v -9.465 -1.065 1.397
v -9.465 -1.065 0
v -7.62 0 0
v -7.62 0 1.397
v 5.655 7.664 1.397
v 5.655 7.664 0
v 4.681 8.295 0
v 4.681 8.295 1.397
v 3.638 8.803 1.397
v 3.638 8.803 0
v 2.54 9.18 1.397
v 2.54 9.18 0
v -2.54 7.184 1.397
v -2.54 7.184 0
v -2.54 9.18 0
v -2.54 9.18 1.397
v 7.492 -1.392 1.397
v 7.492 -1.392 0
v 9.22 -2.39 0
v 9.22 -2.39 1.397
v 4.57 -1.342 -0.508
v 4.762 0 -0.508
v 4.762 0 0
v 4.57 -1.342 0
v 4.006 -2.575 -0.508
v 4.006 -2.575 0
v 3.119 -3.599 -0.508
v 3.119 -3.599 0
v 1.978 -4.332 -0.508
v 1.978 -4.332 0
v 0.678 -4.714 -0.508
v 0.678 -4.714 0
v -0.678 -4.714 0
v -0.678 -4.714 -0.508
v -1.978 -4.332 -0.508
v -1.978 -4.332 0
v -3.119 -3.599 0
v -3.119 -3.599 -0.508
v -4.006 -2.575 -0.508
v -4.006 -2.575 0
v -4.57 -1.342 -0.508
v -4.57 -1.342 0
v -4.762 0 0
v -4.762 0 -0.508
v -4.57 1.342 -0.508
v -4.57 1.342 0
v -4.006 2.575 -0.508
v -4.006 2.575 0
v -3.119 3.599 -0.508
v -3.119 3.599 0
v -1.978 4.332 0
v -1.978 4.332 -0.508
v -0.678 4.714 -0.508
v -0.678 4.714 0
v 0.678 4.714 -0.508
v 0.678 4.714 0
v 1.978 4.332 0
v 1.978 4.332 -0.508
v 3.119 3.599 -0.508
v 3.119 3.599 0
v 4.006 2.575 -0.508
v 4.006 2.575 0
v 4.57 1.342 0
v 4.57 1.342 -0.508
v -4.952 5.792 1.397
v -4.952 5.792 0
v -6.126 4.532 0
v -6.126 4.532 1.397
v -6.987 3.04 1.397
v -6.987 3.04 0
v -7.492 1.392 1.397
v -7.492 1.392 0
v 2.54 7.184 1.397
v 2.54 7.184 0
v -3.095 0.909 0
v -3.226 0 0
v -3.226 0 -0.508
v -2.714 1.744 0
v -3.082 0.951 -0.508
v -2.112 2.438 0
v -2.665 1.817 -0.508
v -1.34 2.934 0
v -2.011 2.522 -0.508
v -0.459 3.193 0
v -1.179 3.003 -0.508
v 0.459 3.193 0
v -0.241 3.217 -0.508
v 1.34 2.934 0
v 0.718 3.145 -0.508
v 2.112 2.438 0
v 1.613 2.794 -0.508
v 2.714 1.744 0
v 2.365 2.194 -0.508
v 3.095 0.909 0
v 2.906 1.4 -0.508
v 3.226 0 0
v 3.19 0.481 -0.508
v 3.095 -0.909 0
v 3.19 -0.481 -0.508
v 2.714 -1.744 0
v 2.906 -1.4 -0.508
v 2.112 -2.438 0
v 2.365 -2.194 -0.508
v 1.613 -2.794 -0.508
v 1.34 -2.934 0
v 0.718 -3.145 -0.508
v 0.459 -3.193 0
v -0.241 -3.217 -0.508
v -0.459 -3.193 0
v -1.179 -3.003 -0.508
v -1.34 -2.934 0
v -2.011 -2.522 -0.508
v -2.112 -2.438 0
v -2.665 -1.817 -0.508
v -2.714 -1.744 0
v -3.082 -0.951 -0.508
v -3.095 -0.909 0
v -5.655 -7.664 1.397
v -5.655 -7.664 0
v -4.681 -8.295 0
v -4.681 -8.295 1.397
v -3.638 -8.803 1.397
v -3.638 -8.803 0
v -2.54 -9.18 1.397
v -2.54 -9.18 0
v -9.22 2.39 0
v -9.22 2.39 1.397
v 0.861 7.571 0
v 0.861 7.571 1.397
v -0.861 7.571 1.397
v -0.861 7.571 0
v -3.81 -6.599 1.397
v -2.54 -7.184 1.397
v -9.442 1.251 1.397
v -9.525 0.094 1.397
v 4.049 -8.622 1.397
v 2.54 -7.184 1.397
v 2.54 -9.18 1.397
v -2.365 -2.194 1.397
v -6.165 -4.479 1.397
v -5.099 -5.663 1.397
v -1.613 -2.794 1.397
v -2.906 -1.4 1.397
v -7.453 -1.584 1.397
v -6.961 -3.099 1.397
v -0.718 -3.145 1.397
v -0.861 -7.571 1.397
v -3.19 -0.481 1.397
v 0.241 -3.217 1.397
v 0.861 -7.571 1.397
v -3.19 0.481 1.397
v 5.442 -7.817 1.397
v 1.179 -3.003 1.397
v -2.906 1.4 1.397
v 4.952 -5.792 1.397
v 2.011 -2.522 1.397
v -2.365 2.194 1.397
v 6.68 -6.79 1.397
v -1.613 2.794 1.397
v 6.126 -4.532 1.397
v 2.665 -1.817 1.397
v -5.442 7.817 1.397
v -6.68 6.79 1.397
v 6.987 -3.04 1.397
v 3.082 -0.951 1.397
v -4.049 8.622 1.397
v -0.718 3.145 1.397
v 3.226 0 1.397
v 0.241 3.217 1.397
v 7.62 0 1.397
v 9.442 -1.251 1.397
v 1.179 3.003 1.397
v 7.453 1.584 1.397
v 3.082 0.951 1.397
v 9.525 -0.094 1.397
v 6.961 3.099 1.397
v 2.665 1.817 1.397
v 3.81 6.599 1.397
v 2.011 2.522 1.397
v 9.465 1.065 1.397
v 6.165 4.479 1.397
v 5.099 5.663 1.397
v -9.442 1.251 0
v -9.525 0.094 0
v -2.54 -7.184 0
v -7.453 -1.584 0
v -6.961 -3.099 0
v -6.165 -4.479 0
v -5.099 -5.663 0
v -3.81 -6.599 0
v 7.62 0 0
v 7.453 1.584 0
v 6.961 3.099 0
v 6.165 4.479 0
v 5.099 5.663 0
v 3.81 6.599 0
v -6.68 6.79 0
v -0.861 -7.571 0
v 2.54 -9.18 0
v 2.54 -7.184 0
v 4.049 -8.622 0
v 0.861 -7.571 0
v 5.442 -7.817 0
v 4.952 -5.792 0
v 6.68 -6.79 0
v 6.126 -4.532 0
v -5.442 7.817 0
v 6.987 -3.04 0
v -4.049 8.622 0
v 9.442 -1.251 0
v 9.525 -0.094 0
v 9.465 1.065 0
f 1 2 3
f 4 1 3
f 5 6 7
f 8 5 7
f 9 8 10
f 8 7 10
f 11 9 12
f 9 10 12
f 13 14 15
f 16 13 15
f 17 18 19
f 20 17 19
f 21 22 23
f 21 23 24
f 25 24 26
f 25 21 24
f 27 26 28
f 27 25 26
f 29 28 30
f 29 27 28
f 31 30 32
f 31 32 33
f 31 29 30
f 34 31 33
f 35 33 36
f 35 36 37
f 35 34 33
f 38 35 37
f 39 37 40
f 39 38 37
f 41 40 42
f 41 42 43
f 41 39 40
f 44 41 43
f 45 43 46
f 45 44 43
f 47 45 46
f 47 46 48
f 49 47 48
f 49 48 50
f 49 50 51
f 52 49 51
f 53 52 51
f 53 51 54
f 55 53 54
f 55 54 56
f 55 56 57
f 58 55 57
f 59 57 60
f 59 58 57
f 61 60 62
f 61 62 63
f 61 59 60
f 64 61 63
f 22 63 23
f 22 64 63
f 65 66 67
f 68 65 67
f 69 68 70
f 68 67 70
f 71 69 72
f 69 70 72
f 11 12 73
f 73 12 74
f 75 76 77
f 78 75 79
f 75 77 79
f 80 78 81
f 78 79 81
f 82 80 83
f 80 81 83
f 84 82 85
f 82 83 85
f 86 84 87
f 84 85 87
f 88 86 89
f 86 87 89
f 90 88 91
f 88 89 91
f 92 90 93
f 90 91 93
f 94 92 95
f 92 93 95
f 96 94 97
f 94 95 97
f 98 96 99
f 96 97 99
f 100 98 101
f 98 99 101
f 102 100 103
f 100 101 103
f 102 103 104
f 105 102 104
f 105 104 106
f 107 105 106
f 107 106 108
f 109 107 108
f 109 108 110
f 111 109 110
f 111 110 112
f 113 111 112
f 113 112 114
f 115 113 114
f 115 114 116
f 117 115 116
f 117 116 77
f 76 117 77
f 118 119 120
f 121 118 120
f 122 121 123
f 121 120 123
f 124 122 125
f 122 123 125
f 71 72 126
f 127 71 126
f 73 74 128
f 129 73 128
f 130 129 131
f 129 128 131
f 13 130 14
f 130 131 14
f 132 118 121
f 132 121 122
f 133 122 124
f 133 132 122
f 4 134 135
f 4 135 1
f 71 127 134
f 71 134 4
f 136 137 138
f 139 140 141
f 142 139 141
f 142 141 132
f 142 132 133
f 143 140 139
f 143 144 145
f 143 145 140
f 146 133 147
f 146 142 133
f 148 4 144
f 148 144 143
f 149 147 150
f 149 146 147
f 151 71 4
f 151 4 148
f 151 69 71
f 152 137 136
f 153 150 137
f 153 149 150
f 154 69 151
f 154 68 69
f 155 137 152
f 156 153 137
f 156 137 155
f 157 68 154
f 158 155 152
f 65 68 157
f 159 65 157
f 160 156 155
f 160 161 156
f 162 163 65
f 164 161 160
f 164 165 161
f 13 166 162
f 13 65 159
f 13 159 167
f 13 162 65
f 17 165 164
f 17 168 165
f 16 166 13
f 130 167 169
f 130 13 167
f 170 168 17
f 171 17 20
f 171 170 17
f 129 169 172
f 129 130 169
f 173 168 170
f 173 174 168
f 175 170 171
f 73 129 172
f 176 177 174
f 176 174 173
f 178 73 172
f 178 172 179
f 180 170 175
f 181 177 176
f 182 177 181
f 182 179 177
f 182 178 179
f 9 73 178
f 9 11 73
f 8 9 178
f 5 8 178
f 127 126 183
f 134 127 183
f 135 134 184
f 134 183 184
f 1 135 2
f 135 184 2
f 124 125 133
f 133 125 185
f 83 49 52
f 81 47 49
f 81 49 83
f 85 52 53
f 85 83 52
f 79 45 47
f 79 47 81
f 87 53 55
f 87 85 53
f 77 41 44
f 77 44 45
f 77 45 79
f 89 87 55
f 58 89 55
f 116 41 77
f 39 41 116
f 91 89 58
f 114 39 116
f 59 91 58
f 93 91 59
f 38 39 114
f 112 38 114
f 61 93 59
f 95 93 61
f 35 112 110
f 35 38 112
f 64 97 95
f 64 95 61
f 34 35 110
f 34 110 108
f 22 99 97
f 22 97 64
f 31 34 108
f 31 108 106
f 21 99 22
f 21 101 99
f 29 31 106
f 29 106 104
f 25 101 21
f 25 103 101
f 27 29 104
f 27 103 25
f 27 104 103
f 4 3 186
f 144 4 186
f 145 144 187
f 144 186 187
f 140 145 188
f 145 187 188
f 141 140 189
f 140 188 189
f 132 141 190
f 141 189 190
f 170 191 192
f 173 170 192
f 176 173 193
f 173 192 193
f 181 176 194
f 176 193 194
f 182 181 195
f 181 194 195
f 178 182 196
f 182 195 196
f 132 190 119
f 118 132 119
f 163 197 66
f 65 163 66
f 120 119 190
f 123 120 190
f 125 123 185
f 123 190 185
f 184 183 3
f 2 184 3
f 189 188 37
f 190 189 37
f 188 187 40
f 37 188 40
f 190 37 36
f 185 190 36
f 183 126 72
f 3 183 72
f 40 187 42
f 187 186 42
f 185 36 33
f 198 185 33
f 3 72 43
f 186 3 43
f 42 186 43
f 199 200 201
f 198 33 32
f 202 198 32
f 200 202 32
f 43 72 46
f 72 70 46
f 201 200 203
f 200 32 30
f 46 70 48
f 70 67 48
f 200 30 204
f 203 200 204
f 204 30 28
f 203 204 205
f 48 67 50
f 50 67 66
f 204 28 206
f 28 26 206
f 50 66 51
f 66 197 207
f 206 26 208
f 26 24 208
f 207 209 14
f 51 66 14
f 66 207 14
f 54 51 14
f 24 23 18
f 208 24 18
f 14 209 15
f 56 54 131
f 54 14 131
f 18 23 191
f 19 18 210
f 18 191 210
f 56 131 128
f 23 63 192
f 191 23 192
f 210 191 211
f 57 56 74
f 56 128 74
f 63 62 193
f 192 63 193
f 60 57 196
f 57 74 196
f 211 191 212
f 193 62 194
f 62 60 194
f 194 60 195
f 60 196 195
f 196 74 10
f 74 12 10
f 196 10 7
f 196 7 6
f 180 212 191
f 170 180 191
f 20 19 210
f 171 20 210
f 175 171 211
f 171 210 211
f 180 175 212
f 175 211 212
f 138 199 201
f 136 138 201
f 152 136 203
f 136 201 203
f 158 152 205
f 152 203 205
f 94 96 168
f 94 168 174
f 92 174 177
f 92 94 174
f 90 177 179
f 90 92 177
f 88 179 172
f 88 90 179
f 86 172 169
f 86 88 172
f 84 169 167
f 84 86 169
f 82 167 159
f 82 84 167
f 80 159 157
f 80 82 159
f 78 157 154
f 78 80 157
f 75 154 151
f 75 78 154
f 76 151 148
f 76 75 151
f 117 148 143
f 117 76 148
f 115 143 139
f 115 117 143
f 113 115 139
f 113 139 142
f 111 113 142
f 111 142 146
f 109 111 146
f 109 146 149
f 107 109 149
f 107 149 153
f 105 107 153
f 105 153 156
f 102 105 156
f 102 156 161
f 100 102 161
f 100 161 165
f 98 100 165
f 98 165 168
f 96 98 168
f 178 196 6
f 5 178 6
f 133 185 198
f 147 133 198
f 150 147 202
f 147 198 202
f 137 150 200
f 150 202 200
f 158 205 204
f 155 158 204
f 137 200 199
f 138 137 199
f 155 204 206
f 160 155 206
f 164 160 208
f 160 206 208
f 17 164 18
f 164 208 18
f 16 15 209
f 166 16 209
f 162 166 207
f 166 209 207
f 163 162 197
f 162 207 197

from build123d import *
from build123d.topology import SkipClean

# Parameters (mm, degrees)
SKETCH1_R      = 3.2258
EXTRUDE1_DEPTH = 1.397
EXTRUDE2_START = 0.508
SKETCH2_R      = 4.7625
SKETCH2_R_2    = 3.2258
EXTRUDE2_DEPTH = 0.508


with BuildPart() as part:
    # Sketch1 → Extrude1 (new body)
    with BuildSketch(Plane.XY):
        with BuildLine():
            Line((-7.491703947, 1.392397923), (-9.220189856, 2.390339728))
            ThreePointArc((-9.220189856, 2.390339728), (-9.501142646, 0.673730975), (-9.465234371, -1.065346561))
            Line((-9.465234371, -1.065346561), (-7.62, 0))
            ThreePointArc((-7.62, 0), (-6.599113577, -3.81), (-3.81, -6.599113577))
            Line((-3.81, -6.599113577), (-5.655234371, -7.664460138))
            ThreePointArc((-5.655234371, -7.664460138), (-4.167103183, -8.565096384), (-2.54, -9.180088507))
            Line((-2.54, -9.180088507), (-2.54, -7.184204897))
            ThreePointArc((-2.54, -7.184204897), (0, -7.62), (2.54, -7.184204897))
            Line((2.54, -7.184204897), (2.54, -9.180088507))
            ThreePointArc((2.54, -9.180088507), (4.7625, -8.248891971), (6.680189856, -6.789748779))
            Line((6.680189856, -6.789748779), (4.951703947, -5.791806974))
            ThreePointArc((4.951703947, -5.791806974), (6.599113577, -3.81), (7.491703947, -1.392397923))
            Line((7.491703947, -1.392397923), (9.220189856, -2.390339728))
            ThreePointArc((9.220189856, -2.390339728), (9.501142646, -0.673730975), (9.465234371, 1.065346561))
            Line((9.465234371, 1.065346561), (7.62, 0))
            ThreePointArc((7.62, 0), (6.599113577, 3.81), (3.81, 6.599113577))
            Line((3.81, 6.599113577), (5.655234371, 7.664460138))
            ThreePointArc((5.655234371, 7.664460138), (4.167103183, 8.565096384), (2.54, 9.180088507))
            Line((2.54, 9.180088507), (2.54, 7.184204897))
            ThreePointArc((2.54, 7.184204897), (0, 7.62), (-2.54, 7.184204897))
            Line((-2.54, 7.184204897), (-2.54, 9.180088507))
            ThreePointArc((-2.54, 9.180088507), (-4.7625, 8.248891971), (-6.680189856, 6.789748779))
            Line((-6.680189856, 6.789748779), (-4.951703947, 5.791806974))
            ThreePointArc((-4.951703947, 5.791806974), (-6.599113577, 3.81), (-7.491703947, 1.392397923))
        make_face()
        Circle(SKETCH1_R, mode=Mode.SUBTRACT)
    extrude(amount=EXTRUDE1_DEPTH)

    # Sketch2 → Extrude2 (add)
    with SkipClean():  # the faces are left unmerged after this step: merging them gives an invalid solid
        with BuildSketch(Plane(origin=(0, 0, 0), x_dir=(-1, 0, 0), z_dir=(0, 0, -1)).offset(EXTRUDE2_START)):
            with Locations(Location((0, 0, 0), (0, 0, 180))):
                Circle(SKETCH2_R)
            Circle(SKETCH2_R_2, mode=Mode.SUBTRACT)
        extrude(amount=-EXTRUDE2_DEPTH)


solid = part.part
